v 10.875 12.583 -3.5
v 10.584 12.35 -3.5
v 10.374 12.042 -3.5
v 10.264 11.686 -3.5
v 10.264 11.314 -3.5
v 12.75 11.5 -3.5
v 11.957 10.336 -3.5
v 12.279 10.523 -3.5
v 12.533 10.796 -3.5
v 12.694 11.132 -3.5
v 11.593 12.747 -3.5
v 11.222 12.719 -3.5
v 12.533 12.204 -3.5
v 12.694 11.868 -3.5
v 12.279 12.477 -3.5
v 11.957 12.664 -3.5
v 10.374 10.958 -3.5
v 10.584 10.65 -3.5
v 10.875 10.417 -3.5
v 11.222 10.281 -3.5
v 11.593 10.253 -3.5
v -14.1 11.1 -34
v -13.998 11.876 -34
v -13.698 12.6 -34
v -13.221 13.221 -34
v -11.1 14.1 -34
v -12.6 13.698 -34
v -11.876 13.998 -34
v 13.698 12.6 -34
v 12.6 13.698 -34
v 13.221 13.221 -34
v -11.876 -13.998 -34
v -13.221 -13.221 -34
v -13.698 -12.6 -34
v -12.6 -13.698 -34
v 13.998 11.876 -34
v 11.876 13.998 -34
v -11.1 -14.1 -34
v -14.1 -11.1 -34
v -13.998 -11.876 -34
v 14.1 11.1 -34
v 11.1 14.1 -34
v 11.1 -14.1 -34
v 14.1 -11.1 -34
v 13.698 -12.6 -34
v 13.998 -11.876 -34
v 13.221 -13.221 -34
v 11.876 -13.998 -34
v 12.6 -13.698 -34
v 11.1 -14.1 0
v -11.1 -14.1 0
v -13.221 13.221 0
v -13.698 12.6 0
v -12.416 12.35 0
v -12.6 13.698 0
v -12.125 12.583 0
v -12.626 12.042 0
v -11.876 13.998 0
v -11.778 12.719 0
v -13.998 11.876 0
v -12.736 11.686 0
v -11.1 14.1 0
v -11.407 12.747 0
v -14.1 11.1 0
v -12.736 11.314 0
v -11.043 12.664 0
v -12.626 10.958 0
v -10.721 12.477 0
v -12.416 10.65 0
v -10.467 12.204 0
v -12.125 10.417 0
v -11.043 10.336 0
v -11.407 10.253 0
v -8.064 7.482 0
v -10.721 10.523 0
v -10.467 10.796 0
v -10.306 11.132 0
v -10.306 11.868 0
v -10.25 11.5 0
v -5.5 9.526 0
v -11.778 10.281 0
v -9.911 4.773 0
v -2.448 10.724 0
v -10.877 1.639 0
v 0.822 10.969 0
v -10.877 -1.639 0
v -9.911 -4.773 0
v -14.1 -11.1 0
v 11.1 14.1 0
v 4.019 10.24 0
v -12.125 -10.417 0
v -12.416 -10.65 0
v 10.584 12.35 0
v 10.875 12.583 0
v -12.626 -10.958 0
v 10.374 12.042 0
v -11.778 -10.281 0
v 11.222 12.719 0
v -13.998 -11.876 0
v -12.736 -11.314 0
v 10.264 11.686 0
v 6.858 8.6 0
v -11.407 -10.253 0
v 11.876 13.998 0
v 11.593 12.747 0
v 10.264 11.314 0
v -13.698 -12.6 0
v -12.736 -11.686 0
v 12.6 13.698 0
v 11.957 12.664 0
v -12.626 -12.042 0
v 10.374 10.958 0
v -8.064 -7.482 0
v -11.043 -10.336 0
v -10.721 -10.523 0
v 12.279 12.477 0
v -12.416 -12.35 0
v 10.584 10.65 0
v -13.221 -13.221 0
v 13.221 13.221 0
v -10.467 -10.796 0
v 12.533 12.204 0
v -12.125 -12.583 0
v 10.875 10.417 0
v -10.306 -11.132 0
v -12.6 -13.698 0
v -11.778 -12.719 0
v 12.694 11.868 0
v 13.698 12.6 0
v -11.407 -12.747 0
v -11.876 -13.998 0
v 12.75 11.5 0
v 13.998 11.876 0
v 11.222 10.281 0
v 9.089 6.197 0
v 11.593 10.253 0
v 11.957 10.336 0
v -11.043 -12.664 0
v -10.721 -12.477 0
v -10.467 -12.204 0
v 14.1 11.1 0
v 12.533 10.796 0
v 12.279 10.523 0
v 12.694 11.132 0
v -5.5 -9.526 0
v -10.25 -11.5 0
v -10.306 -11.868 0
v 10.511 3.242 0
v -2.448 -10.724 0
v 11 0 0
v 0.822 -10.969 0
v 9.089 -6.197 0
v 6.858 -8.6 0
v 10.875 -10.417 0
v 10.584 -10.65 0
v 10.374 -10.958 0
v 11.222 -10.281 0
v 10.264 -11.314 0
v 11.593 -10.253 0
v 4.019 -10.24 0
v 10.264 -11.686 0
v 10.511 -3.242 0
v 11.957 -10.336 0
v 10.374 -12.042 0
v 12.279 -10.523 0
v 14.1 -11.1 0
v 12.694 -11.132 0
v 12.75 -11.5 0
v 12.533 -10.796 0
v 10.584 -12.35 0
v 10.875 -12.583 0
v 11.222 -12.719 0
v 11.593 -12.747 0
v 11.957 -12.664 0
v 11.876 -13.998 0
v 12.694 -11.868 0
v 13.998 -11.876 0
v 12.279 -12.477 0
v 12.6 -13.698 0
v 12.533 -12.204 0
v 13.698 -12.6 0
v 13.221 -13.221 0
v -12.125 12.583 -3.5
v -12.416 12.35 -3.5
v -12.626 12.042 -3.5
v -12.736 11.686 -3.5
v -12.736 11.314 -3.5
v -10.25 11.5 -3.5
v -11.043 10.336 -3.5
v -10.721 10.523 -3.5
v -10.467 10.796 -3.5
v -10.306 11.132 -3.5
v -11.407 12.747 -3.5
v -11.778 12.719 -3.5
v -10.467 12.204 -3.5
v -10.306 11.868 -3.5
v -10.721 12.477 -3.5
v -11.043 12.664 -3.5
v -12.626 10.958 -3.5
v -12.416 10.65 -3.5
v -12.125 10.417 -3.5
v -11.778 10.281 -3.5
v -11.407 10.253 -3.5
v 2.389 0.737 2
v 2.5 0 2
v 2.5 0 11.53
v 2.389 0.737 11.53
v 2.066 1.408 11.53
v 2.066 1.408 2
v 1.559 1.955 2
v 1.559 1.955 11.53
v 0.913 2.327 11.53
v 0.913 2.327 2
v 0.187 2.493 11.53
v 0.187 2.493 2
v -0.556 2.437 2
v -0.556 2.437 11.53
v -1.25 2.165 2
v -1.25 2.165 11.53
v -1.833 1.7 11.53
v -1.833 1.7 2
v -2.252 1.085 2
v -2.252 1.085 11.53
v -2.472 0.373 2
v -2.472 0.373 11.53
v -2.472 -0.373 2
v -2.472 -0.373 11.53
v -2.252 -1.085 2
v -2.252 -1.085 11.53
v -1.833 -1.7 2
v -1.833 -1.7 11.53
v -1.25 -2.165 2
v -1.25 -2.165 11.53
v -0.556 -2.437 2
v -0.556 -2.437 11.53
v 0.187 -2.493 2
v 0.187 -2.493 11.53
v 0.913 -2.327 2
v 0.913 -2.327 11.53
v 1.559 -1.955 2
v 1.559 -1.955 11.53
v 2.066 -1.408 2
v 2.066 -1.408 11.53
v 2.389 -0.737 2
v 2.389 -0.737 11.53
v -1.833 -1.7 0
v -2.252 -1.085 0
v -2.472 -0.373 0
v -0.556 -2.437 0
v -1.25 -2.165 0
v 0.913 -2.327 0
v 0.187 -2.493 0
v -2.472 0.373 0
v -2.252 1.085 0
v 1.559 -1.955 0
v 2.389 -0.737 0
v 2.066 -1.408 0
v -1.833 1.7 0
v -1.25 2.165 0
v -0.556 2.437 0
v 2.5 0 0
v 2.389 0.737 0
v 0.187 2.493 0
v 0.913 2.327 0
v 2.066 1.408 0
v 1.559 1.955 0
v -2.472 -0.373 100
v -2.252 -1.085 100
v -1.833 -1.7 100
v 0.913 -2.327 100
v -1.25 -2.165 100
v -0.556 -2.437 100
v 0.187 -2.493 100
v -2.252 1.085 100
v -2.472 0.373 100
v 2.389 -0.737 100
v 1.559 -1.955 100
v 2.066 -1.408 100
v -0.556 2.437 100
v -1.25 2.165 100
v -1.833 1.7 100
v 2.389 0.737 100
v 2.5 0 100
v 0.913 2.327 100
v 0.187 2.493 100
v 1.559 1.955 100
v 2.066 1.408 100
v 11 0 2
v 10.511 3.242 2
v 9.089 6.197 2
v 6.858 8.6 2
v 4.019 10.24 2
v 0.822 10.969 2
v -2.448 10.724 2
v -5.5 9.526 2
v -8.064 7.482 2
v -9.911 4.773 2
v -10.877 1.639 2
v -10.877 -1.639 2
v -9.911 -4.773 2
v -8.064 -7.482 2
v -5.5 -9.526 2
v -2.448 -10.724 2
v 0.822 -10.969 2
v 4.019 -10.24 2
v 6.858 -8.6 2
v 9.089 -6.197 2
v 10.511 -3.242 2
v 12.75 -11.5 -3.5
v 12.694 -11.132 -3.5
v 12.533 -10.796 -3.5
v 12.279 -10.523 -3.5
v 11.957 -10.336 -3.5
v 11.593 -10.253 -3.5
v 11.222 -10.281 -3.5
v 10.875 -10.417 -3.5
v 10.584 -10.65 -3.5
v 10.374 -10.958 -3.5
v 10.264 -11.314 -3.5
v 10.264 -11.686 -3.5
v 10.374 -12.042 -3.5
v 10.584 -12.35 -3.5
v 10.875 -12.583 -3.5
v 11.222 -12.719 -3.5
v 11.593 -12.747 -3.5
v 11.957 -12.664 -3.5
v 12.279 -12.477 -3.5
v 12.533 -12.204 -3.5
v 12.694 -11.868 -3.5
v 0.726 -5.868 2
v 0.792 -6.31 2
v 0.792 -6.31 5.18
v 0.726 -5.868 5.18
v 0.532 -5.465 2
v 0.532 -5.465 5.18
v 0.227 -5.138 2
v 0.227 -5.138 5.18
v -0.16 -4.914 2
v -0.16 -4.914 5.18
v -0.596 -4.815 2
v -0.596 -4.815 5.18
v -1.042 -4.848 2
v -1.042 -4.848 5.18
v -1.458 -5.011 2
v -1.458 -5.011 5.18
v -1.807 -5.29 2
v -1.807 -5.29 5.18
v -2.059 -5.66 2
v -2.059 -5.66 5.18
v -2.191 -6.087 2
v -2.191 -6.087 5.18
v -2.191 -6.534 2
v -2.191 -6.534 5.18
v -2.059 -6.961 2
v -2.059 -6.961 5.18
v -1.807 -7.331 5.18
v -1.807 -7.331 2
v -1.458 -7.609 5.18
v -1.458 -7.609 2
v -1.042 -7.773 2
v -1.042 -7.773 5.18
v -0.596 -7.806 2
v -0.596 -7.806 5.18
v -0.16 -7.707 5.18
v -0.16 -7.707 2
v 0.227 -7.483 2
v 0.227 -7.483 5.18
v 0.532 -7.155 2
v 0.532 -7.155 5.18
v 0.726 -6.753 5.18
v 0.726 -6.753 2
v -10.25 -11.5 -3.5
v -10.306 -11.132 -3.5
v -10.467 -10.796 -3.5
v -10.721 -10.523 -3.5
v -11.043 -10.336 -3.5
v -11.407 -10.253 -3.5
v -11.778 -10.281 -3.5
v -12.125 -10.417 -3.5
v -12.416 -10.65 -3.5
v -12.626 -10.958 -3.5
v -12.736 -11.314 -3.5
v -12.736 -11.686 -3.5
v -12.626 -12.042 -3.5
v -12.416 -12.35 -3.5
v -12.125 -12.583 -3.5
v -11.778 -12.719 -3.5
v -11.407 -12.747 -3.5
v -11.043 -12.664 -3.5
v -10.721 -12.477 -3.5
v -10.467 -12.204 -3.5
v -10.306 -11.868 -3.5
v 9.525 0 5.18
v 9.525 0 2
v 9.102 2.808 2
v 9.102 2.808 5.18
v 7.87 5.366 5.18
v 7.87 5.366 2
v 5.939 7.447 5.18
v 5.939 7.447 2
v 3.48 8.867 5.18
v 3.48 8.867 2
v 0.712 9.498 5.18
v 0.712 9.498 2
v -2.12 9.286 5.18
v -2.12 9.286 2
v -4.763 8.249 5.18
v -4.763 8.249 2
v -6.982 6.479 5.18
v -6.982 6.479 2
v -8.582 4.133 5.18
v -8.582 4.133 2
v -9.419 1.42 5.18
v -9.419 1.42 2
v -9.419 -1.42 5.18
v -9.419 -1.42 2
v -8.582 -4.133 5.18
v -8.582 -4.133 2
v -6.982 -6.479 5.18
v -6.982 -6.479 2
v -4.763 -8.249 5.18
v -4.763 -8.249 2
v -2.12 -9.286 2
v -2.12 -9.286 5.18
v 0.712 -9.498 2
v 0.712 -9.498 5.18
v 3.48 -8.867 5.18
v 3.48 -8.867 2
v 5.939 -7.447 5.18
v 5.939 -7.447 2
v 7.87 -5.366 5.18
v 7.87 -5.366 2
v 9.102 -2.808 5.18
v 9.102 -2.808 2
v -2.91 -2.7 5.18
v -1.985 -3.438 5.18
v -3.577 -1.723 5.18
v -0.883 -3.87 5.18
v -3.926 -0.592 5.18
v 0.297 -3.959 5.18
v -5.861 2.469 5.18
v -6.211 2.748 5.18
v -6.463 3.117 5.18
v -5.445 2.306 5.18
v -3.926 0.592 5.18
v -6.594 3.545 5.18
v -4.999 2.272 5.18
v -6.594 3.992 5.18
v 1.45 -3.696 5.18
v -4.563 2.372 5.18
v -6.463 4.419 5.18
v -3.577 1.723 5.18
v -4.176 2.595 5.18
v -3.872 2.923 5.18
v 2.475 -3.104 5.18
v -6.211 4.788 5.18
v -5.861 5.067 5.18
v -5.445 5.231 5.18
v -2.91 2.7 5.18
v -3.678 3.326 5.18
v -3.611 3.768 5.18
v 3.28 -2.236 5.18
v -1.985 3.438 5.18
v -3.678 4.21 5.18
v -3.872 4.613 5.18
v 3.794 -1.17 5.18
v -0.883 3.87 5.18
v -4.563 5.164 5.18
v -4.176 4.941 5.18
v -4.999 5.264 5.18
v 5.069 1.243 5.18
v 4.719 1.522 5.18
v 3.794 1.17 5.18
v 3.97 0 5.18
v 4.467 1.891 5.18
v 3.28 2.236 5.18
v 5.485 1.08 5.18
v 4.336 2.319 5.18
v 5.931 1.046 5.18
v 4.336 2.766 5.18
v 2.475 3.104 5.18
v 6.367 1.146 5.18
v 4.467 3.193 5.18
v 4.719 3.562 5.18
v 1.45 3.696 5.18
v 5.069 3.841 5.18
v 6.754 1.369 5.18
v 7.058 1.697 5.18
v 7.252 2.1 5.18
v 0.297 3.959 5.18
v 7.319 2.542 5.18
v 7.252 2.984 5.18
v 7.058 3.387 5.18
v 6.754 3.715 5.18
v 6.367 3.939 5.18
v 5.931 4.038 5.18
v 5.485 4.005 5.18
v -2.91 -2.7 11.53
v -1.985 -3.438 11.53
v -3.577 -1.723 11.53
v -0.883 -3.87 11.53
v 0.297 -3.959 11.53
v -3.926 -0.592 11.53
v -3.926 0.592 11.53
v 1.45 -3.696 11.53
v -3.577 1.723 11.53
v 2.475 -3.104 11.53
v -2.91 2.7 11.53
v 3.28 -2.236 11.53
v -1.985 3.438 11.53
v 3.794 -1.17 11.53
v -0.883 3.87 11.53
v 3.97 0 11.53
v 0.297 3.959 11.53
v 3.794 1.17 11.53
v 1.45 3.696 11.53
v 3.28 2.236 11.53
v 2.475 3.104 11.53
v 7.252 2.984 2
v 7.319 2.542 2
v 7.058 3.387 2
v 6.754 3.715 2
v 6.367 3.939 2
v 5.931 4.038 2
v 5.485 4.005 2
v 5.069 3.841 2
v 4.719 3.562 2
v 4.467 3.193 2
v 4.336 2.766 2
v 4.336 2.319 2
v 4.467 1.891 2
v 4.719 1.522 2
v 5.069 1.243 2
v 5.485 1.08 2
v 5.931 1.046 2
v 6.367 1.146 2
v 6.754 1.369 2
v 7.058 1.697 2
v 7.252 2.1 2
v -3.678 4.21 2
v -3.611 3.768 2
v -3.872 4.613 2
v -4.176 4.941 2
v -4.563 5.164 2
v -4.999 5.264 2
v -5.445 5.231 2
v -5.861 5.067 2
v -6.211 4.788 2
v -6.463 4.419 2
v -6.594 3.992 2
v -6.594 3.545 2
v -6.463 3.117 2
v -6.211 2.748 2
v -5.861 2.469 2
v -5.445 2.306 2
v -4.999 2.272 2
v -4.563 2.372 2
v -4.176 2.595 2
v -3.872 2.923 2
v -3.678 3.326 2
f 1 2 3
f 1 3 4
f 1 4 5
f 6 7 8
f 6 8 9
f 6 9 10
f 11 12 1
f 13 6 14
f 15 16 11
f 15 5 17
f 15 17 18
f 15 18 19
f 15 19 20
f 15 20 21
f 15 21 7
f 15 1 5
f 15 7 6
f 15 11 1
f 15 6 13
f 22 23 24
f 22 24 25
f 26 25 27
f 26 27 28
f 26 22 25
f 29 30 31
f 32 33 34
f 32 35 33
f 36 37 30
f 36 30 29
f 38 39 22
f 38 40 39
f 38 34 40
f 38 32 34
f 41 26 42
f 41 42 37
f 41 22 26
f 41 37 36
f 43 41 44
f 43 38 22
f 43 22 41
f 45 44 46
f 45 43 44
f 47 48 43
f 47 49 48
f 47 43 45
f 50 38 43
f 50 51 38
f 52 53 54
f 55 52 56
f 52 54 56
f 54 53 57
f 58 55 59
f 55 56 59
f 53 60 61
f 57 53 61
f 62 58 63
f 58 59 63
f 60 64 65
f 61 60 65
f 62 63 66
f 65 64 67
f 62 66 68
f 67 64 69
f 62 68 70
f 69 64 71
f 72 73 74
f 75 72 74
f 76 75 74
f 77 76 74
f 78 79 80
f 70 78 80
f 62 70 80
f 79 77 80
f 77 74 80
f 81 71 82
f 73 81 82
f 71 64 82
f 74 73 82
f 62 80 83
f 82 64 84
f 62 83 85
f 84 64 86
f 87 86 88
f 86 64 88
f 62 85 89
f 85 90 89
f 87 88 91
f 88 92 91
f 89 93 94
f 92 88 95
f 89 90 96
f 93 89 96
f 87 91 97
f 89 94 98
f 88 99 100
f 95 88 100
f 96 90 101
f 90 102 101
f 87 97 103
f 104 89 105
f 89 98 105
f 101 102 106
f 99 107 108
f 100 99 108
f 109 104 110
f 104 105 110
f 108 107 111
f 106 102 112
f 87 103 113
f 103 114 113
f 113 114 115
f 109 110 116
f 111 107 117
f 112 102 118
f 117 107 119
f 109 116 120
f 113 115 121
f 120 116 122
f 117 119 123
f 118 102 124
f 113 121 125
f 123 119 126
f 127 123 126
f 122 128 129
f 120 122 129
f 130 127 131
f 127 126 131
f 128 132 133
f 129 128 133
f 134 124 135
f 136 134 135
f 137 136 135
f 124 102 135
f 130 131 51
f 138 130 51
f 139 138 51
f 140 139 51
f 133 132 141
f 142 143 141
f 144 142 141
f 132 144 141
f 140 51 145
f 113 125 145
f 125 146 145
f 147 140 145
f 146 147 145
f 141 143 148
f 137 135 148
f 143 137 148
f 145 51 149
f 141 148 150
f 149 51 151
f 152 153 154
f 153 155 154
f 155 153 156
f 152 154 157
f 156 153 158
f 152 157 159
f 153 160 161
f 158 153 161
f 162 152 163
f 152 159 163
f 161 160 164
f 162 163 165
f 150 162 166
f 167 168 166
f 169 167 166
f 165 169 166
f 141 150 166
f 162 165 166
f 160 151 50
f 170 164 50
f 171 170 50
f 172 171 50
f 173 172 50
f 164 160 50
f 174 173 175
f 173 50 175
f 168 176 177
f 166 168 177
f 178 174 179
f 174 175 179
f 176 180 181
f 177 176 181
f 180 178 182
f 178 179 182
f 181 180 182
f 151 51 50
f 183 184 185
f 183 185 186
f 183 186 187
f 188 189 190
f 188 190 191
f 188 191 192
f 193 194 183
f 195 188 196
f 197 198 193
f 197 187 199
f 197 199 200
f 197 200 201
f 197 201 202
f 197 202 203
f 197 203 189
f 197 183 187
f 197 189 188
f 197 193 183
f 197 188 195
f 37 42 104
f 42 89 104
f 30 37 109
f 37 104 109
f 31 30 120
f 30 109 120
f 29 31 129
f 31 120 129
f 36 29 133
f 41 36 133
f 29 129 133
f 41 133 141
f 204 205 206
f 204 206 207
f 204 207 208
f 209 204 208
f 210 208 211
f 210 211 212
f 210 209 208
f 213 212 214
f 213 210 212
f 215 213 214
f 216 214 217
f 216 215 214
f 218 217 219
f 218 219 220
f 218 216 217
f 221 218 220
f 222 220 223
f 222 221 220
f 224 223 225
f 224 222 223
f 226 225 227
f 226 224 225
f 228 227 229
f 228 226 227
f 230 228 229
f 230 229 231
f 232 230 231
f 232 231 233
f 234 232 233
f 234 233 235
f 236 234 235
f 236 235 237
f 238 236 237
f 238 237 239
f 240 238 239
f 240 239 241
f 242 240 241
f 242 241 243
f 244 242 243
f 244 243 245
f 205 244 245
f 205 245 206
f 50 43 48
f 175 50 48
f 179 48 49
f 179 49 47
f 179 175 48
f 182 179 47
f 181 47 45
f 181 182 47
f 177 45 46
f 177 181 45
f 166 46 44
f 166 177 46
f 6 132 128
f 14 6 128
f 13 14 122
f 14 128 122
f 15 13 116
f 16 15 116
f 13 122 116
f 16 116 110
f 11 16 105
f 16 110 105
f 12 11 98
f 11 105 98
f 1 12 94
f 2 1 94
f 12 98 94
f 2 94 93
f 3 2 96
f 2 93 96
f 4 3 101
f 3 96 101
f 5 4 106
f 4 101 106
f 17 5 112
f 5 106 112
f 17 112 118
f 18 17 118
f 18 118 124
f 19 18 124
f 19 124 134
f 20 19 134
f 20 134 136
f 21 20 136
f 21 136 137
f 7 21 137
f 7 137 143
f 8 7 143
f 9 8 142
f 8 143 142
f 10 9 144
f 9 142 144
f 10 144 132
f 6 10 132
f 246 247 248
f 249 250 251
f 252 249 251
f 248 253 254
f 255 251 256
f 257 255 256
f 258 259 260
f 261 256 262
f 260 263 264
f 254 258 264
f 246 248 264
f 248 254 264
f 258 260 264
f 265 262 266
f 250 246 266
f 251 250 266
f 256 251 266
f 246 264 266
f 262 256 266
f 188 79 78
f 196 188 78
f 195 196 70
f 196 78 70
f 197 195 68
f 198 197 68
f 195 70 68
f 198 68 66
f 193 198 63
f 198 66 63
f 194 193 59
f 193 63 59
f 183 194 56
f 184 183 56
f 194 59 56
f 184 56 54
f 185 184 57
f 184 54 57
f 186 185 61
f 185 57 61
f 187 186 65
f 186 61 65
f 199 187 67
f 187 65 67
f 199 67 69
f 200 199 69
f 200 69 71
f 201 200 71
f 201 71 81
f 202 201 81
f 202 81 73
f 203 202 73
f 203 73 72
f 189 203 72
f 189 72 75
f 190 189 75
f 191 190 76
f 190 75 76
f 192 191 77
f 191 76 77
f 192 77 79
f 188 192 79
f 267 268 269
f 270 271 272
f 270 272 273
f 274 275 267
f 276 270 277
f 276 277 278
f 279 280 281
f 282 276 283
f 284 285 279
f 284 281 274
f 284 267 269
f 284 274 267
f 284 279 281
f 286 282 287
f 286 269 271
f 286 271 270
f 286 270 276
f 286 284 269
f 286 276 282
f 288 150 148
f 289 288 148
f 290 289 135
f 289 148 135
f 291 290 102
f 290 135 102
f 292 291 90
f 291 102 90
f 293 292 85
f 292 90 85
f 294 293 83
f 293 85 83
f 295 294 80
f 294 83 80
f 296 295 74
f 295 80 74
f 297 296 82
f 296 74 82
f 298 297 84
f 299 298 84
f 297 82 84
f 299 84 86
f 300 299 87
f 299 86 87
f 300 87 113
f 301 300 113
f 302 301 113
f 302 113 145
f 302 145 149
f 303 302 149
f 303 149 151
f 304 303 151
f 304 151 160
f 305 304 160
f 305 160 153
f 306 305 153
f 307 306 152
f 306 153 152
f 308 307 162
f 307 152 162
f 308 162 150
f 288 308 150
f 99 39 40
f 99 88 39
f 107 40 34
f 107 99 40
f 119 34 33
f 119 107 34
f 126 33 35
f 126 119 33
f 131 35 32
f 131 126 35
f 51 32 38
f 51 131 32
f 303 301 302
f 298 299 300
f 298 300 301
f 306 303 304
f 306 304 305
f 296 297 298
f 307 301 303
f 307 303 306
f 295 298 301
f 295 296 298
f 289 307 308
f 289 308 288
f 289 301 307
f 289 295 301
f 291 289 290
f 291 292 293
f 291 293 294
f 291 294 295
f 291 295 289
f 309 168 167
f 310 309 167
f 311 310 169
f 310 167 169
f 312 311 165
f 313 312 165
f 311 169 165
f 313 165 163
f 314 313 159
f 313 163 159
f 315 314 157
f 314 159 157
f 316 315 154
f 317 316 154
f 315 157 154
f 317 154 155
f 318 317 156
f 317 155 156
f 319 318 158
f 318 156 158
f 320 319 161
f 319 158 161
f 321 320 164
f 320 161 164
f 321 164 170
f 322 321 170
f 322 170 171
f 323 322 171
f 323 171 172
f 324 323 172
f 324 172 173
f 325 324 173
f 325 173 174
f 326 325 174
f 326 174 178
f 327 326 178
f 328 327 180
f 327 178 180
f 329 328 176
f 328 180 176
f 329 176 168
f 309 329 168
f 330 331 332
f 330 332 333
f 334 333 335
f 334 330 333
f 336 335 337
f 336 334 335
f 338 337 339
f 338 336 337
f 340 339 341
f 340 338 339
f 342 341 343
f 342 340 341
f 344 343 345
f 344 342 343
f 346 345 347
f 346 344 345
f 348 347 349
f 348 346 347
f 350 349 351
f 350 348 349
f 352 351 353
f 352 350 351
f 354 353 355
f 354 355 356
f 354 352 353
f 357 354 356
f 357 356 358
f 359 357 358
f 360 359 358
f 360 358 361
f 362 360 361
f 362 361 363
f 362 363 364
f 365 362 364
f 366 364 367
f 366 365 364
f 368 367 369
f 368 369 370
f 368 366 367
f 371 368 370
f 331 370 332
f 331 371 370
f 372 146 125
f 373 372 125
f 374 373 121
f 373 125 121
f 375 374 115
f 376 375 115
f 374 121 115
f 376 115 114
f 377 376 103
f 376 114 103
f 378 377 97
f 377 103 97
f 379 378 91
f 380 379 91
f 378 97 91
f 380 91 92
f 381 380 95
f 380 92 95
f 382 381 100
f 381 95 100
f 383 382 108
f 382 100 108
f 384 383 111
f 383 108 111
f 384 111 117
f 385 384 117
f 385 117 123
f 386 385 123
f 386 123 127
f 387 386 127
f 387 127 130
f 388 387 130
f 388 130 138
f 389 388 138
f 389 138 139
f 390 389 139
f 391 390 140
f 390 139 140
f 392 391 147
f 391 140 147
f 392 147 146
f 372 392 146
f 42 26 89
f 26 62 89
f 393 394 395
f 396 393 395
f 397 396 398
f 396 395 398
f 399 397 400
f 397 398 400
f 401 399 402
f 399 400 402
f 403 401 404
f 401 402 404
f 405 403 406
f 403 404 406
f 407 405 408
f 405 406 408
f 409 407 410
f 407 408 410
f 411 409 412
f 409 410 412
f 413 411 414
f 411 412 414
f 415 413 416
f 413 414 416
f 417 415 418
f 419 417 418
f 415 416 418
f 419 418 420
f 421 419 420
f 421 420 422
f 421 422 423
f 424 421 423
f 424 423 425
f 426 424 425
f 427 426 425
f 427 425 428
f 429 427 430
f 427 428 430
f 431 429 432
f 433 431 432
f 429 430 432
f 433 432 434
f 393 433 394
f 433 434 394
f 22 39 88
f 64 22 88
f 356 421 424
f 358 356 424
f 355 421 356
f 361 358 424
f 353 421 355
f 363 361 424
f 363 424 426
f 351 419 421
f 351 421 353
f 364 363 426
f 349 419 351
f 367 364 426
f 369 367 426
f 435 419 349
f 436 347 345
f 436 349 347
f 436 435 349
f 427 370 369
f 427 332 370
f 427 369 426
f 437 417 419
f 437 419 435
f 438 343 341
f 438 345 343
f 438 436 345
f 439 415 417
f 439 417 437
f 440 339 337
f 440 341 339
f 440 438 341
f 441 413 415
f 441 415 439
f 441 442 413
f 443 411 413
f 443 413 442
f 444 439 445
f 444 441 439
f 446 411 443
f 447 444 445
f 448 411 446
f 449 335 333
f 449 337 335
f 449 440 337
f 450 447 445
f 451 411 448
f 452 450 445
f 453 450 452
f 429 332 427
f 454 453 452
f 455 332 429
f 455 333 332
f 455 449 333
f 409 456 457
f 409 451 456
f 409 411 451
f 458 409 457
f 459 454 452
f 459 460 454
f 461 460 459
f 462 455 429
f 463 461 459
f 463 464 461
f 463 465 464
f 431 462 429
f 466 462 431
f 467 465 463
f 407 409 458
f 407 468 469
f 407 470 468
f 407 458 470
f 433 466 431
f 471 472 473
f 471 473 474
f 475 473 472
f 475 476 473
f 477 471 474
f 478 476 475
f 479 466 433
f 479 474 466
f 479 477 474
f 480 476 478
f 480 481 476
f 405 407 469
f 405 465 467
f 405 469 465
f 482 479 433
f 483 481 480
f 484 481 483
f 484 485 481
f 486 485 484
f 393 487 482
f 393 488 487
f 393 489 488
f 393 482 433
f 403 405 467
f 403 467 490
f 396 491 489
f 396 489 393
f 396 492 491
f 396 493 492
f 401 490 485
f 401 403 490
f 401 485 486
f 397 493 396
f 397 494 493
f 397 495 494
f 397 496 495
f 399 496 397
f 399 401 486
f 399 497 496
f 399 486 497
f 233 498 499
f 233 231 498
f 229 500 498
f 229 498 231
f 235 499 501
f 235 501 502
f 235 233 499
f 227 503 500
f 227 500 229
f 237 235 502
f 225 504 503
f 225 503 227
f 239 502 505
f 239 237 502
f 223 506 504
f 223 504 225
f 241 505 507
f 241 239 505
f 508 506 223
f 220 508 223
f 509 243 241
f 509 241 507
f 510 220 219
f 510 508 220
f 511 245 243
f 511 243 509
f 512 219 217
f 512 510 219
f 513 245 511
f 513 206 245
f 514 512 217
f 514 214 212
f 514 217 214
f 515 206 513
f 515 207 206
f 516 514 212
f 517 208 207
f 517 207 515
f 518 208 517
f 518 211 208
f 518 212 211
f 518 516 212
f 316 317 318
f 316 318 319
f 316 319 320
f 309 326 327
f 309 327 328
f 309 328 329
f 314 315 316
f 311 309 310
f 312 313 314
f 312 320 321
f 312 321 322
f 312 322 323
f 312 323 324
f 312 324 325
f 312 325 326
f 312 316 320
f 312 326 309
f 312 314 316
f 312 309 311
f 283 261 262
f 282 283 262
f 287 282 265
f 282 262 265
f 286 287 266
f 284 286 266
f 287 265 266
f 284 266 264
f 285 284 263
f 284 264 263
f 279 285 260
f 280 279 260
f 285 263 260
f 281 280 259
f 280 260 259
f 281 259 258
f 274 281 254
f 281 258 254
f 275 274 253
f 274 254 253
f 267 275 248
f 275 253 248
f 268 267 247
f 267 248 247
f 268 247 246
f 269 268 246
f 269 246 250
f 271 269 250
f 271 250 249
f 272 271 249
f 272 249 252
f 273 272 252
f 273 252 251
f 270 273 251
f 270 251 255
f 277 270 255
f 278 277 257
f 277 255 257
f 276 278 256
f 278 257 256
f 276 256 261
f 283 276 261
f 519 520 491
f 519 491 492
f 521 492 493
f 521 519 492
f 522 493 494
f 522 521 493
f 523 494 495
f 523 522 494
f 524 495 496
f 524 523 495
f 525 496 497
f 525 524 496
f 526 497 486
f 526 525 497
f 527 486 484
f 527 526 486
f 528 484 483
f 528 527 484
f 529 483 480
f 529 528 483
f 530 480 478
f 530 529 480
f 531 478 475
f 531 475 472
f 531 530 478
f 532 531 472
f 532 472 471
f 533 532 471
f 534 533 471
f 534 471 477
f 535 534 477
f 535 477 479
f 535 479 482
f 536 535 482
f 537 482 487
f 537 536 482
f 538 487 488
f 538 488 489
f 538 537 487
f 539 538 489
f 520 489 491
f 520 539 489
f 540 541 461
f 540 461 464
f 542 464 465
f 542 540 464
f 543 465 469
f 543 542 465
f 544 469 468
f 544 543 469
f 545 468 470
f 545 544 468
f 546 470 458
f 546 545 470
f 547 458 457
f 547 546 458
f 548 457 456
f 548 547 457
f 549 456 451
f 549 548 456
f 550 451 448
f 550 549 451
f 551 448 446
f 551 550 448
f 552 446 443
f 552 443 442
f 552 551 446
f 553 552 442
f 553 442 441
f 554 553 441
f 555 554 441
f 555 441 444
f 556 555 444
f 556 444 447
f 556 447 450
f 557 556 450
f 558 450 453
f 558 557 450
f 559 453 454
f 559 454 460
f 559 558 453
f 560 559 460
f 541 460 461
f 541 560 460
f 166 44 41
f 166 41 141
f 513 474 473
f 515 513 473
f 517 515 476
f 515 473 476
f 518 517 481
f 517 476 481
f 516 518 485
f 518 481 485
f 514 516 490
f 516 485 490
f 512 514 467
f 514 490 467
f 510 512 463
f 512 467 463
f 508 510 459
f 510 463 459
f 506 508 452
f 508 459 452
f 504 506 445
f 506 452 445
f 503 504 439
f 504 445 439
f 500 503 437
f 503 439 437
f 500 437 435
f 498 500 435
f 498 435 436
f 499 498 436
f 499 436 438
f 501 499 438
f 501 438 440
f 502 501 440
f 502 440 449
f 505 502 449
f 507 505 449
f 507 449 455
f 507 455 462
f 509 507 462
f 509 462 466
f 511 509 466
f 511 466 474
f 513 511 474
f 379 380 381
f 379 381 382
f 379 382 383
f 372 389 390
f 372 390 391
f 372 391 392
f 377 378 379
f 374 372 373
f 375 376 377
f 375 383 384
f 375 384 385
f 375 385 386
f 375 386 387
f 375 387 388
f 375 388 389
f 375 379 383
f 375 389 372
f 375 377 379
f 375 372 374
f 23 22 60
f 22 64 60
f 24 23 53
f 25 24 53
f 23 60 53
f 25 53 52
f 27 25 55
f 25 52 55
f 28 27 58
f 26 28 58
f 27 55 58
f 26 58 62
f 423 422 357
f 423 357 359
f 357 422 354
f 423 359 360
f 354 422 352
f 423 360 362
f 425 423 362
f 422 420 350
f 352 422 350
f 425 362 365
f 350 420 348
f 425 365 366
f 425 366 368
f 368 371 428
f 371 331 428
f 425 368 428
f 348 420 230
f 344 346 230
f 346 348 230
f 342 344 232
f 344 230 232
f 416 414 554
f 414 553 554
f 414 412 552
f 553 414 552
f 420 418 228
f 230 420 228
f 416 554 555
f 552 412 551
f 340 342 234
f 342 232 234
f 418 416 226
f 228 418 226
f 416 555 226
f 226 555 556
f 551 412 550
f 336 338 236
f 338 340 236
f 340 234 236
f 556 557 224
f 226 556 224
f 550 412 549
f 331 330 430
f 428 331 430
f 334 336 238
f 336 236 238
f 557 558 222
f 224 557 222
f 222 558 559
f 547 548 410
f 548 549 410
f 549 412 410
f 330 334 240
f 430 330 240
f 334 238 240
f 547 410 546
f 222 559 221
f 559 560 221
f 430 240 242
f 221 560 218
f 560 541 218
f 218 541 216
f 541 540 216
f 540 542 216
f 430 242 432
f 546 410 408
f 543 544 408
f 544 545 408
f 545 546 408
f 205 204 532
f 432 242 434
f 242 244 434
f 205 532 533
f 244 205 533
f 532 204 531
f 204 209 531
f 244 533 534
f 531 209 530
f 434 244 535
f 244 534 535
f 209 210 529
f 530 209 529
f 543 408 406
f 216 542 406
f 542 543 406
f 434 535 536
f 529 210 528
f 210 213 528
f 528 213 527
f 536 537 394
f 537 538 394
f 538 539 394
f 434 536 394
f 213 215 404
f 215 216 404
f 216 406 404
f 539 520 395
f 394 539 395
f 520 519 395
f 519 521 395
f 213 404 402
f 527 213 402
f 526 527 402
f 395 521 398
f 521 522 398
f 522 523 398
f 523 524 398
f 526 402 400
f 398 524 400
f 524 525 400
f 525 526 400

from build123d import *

# Parameters (mm, degrees)
F0_W      = 28.2
F0_H      = 34
F1_DEPTH  = 14.1
F2_R      = 1.25
F3_DEPTH  = 3.5
F4_R      = 11
F5_DEPTH  = 2
F6_R      = 2.5
F7_DEPTH  = 100
F8_R      = 3
F9_R      = 9.525
F9_R_2    = 2.5
F10_DEPTH = 3.18
F11_R     = 3.97
F11_R_2   = 2.5
F12_DEPTH = 9.53
F13_R     = 1.5
F14_DEPTH = 3.18


with BuildPart() as f1:
    # F0 (on Front) → F1 (new body, symmetric)
    with BuildSketch(Plane.XZ):
        with Locations((0, -17)):
            Rectangle(F0_W, F0_H)
    extrude(amount=F1_DEPTH, both=True)

    # F2 (on face) → F3 (cut)
    with BuildSketch(Plane.XY):
        with Locations((11.5, 11.5)):
            Circle(F2_R)
        with Locations((11.5, -11.5)):
            Circle(F2_R)
        with Locations((-11.5, -11.5)):
            Circle(F2_R)
        with Locations((-11.5, 11.5)):
            Circle(F2_R)
    extrude(amount=-F3_DEPTH, mode=Mode.SUBTRACT)

    # F4 (on face) → F5 (join)
    with BuildSketch(Plane.XY):
        Circle(F4_R)
    extrude(amount=F5_DEPTH)

    # F8
    f8_edges = [f1.edges().sort_by_distance(p)[0] for p in [
        (-14.1, 14.1, -17),
        (14.1, 14.1, -17),
        (-14.1, -14.1, -17),
        (14.1, -14.1, -17),
    ]]
    fillet(f8_edges, radius=F8_R)


with BuildPart() as f7:
    # F6 (on face) → F7 (new body)
    with BuildSketch(Plane.XY):
        Circle(F6_R)
    extrude(amount=F7_DEPTH)


with BuildPart() as f10:
    # F9 (on face) → F10 (new body)
    with BuildSketch(Plane.XY.offset(2)):
        Circle(F9_R)
        Circle(F9_R_2, mode=Mode.SUBTRACT)
    extrude(amount=F10_DEPTH)

    # F11 (on face) → F12 (join)
    with BuildSketch(Plane.XY.offset(2)):
        Circle(F11_R)
        Circle(F11_R_2, mode=Mode.SUBTRACT)
    extrude(amount=F12_DEPTH)

    # F13 (on face) → F14 (cut, through all)
    with BuildSketch(Plane.XY.offset(2)):
        with Locations((5.8188930752, 2.5422398352)):
            Circle(F13_R)
        with Locations((-5.1110908174, 3.7681893074)):
            Circle(F13_R)
        with Locations((-0.7078022578, -6.3104291426)):
            Circle(F13_R)
    extrude(amount=F14_DEPTH, mode=Mode.SUBTRACT)


solid = Compound([f1.part, f7.part, f10.part])
